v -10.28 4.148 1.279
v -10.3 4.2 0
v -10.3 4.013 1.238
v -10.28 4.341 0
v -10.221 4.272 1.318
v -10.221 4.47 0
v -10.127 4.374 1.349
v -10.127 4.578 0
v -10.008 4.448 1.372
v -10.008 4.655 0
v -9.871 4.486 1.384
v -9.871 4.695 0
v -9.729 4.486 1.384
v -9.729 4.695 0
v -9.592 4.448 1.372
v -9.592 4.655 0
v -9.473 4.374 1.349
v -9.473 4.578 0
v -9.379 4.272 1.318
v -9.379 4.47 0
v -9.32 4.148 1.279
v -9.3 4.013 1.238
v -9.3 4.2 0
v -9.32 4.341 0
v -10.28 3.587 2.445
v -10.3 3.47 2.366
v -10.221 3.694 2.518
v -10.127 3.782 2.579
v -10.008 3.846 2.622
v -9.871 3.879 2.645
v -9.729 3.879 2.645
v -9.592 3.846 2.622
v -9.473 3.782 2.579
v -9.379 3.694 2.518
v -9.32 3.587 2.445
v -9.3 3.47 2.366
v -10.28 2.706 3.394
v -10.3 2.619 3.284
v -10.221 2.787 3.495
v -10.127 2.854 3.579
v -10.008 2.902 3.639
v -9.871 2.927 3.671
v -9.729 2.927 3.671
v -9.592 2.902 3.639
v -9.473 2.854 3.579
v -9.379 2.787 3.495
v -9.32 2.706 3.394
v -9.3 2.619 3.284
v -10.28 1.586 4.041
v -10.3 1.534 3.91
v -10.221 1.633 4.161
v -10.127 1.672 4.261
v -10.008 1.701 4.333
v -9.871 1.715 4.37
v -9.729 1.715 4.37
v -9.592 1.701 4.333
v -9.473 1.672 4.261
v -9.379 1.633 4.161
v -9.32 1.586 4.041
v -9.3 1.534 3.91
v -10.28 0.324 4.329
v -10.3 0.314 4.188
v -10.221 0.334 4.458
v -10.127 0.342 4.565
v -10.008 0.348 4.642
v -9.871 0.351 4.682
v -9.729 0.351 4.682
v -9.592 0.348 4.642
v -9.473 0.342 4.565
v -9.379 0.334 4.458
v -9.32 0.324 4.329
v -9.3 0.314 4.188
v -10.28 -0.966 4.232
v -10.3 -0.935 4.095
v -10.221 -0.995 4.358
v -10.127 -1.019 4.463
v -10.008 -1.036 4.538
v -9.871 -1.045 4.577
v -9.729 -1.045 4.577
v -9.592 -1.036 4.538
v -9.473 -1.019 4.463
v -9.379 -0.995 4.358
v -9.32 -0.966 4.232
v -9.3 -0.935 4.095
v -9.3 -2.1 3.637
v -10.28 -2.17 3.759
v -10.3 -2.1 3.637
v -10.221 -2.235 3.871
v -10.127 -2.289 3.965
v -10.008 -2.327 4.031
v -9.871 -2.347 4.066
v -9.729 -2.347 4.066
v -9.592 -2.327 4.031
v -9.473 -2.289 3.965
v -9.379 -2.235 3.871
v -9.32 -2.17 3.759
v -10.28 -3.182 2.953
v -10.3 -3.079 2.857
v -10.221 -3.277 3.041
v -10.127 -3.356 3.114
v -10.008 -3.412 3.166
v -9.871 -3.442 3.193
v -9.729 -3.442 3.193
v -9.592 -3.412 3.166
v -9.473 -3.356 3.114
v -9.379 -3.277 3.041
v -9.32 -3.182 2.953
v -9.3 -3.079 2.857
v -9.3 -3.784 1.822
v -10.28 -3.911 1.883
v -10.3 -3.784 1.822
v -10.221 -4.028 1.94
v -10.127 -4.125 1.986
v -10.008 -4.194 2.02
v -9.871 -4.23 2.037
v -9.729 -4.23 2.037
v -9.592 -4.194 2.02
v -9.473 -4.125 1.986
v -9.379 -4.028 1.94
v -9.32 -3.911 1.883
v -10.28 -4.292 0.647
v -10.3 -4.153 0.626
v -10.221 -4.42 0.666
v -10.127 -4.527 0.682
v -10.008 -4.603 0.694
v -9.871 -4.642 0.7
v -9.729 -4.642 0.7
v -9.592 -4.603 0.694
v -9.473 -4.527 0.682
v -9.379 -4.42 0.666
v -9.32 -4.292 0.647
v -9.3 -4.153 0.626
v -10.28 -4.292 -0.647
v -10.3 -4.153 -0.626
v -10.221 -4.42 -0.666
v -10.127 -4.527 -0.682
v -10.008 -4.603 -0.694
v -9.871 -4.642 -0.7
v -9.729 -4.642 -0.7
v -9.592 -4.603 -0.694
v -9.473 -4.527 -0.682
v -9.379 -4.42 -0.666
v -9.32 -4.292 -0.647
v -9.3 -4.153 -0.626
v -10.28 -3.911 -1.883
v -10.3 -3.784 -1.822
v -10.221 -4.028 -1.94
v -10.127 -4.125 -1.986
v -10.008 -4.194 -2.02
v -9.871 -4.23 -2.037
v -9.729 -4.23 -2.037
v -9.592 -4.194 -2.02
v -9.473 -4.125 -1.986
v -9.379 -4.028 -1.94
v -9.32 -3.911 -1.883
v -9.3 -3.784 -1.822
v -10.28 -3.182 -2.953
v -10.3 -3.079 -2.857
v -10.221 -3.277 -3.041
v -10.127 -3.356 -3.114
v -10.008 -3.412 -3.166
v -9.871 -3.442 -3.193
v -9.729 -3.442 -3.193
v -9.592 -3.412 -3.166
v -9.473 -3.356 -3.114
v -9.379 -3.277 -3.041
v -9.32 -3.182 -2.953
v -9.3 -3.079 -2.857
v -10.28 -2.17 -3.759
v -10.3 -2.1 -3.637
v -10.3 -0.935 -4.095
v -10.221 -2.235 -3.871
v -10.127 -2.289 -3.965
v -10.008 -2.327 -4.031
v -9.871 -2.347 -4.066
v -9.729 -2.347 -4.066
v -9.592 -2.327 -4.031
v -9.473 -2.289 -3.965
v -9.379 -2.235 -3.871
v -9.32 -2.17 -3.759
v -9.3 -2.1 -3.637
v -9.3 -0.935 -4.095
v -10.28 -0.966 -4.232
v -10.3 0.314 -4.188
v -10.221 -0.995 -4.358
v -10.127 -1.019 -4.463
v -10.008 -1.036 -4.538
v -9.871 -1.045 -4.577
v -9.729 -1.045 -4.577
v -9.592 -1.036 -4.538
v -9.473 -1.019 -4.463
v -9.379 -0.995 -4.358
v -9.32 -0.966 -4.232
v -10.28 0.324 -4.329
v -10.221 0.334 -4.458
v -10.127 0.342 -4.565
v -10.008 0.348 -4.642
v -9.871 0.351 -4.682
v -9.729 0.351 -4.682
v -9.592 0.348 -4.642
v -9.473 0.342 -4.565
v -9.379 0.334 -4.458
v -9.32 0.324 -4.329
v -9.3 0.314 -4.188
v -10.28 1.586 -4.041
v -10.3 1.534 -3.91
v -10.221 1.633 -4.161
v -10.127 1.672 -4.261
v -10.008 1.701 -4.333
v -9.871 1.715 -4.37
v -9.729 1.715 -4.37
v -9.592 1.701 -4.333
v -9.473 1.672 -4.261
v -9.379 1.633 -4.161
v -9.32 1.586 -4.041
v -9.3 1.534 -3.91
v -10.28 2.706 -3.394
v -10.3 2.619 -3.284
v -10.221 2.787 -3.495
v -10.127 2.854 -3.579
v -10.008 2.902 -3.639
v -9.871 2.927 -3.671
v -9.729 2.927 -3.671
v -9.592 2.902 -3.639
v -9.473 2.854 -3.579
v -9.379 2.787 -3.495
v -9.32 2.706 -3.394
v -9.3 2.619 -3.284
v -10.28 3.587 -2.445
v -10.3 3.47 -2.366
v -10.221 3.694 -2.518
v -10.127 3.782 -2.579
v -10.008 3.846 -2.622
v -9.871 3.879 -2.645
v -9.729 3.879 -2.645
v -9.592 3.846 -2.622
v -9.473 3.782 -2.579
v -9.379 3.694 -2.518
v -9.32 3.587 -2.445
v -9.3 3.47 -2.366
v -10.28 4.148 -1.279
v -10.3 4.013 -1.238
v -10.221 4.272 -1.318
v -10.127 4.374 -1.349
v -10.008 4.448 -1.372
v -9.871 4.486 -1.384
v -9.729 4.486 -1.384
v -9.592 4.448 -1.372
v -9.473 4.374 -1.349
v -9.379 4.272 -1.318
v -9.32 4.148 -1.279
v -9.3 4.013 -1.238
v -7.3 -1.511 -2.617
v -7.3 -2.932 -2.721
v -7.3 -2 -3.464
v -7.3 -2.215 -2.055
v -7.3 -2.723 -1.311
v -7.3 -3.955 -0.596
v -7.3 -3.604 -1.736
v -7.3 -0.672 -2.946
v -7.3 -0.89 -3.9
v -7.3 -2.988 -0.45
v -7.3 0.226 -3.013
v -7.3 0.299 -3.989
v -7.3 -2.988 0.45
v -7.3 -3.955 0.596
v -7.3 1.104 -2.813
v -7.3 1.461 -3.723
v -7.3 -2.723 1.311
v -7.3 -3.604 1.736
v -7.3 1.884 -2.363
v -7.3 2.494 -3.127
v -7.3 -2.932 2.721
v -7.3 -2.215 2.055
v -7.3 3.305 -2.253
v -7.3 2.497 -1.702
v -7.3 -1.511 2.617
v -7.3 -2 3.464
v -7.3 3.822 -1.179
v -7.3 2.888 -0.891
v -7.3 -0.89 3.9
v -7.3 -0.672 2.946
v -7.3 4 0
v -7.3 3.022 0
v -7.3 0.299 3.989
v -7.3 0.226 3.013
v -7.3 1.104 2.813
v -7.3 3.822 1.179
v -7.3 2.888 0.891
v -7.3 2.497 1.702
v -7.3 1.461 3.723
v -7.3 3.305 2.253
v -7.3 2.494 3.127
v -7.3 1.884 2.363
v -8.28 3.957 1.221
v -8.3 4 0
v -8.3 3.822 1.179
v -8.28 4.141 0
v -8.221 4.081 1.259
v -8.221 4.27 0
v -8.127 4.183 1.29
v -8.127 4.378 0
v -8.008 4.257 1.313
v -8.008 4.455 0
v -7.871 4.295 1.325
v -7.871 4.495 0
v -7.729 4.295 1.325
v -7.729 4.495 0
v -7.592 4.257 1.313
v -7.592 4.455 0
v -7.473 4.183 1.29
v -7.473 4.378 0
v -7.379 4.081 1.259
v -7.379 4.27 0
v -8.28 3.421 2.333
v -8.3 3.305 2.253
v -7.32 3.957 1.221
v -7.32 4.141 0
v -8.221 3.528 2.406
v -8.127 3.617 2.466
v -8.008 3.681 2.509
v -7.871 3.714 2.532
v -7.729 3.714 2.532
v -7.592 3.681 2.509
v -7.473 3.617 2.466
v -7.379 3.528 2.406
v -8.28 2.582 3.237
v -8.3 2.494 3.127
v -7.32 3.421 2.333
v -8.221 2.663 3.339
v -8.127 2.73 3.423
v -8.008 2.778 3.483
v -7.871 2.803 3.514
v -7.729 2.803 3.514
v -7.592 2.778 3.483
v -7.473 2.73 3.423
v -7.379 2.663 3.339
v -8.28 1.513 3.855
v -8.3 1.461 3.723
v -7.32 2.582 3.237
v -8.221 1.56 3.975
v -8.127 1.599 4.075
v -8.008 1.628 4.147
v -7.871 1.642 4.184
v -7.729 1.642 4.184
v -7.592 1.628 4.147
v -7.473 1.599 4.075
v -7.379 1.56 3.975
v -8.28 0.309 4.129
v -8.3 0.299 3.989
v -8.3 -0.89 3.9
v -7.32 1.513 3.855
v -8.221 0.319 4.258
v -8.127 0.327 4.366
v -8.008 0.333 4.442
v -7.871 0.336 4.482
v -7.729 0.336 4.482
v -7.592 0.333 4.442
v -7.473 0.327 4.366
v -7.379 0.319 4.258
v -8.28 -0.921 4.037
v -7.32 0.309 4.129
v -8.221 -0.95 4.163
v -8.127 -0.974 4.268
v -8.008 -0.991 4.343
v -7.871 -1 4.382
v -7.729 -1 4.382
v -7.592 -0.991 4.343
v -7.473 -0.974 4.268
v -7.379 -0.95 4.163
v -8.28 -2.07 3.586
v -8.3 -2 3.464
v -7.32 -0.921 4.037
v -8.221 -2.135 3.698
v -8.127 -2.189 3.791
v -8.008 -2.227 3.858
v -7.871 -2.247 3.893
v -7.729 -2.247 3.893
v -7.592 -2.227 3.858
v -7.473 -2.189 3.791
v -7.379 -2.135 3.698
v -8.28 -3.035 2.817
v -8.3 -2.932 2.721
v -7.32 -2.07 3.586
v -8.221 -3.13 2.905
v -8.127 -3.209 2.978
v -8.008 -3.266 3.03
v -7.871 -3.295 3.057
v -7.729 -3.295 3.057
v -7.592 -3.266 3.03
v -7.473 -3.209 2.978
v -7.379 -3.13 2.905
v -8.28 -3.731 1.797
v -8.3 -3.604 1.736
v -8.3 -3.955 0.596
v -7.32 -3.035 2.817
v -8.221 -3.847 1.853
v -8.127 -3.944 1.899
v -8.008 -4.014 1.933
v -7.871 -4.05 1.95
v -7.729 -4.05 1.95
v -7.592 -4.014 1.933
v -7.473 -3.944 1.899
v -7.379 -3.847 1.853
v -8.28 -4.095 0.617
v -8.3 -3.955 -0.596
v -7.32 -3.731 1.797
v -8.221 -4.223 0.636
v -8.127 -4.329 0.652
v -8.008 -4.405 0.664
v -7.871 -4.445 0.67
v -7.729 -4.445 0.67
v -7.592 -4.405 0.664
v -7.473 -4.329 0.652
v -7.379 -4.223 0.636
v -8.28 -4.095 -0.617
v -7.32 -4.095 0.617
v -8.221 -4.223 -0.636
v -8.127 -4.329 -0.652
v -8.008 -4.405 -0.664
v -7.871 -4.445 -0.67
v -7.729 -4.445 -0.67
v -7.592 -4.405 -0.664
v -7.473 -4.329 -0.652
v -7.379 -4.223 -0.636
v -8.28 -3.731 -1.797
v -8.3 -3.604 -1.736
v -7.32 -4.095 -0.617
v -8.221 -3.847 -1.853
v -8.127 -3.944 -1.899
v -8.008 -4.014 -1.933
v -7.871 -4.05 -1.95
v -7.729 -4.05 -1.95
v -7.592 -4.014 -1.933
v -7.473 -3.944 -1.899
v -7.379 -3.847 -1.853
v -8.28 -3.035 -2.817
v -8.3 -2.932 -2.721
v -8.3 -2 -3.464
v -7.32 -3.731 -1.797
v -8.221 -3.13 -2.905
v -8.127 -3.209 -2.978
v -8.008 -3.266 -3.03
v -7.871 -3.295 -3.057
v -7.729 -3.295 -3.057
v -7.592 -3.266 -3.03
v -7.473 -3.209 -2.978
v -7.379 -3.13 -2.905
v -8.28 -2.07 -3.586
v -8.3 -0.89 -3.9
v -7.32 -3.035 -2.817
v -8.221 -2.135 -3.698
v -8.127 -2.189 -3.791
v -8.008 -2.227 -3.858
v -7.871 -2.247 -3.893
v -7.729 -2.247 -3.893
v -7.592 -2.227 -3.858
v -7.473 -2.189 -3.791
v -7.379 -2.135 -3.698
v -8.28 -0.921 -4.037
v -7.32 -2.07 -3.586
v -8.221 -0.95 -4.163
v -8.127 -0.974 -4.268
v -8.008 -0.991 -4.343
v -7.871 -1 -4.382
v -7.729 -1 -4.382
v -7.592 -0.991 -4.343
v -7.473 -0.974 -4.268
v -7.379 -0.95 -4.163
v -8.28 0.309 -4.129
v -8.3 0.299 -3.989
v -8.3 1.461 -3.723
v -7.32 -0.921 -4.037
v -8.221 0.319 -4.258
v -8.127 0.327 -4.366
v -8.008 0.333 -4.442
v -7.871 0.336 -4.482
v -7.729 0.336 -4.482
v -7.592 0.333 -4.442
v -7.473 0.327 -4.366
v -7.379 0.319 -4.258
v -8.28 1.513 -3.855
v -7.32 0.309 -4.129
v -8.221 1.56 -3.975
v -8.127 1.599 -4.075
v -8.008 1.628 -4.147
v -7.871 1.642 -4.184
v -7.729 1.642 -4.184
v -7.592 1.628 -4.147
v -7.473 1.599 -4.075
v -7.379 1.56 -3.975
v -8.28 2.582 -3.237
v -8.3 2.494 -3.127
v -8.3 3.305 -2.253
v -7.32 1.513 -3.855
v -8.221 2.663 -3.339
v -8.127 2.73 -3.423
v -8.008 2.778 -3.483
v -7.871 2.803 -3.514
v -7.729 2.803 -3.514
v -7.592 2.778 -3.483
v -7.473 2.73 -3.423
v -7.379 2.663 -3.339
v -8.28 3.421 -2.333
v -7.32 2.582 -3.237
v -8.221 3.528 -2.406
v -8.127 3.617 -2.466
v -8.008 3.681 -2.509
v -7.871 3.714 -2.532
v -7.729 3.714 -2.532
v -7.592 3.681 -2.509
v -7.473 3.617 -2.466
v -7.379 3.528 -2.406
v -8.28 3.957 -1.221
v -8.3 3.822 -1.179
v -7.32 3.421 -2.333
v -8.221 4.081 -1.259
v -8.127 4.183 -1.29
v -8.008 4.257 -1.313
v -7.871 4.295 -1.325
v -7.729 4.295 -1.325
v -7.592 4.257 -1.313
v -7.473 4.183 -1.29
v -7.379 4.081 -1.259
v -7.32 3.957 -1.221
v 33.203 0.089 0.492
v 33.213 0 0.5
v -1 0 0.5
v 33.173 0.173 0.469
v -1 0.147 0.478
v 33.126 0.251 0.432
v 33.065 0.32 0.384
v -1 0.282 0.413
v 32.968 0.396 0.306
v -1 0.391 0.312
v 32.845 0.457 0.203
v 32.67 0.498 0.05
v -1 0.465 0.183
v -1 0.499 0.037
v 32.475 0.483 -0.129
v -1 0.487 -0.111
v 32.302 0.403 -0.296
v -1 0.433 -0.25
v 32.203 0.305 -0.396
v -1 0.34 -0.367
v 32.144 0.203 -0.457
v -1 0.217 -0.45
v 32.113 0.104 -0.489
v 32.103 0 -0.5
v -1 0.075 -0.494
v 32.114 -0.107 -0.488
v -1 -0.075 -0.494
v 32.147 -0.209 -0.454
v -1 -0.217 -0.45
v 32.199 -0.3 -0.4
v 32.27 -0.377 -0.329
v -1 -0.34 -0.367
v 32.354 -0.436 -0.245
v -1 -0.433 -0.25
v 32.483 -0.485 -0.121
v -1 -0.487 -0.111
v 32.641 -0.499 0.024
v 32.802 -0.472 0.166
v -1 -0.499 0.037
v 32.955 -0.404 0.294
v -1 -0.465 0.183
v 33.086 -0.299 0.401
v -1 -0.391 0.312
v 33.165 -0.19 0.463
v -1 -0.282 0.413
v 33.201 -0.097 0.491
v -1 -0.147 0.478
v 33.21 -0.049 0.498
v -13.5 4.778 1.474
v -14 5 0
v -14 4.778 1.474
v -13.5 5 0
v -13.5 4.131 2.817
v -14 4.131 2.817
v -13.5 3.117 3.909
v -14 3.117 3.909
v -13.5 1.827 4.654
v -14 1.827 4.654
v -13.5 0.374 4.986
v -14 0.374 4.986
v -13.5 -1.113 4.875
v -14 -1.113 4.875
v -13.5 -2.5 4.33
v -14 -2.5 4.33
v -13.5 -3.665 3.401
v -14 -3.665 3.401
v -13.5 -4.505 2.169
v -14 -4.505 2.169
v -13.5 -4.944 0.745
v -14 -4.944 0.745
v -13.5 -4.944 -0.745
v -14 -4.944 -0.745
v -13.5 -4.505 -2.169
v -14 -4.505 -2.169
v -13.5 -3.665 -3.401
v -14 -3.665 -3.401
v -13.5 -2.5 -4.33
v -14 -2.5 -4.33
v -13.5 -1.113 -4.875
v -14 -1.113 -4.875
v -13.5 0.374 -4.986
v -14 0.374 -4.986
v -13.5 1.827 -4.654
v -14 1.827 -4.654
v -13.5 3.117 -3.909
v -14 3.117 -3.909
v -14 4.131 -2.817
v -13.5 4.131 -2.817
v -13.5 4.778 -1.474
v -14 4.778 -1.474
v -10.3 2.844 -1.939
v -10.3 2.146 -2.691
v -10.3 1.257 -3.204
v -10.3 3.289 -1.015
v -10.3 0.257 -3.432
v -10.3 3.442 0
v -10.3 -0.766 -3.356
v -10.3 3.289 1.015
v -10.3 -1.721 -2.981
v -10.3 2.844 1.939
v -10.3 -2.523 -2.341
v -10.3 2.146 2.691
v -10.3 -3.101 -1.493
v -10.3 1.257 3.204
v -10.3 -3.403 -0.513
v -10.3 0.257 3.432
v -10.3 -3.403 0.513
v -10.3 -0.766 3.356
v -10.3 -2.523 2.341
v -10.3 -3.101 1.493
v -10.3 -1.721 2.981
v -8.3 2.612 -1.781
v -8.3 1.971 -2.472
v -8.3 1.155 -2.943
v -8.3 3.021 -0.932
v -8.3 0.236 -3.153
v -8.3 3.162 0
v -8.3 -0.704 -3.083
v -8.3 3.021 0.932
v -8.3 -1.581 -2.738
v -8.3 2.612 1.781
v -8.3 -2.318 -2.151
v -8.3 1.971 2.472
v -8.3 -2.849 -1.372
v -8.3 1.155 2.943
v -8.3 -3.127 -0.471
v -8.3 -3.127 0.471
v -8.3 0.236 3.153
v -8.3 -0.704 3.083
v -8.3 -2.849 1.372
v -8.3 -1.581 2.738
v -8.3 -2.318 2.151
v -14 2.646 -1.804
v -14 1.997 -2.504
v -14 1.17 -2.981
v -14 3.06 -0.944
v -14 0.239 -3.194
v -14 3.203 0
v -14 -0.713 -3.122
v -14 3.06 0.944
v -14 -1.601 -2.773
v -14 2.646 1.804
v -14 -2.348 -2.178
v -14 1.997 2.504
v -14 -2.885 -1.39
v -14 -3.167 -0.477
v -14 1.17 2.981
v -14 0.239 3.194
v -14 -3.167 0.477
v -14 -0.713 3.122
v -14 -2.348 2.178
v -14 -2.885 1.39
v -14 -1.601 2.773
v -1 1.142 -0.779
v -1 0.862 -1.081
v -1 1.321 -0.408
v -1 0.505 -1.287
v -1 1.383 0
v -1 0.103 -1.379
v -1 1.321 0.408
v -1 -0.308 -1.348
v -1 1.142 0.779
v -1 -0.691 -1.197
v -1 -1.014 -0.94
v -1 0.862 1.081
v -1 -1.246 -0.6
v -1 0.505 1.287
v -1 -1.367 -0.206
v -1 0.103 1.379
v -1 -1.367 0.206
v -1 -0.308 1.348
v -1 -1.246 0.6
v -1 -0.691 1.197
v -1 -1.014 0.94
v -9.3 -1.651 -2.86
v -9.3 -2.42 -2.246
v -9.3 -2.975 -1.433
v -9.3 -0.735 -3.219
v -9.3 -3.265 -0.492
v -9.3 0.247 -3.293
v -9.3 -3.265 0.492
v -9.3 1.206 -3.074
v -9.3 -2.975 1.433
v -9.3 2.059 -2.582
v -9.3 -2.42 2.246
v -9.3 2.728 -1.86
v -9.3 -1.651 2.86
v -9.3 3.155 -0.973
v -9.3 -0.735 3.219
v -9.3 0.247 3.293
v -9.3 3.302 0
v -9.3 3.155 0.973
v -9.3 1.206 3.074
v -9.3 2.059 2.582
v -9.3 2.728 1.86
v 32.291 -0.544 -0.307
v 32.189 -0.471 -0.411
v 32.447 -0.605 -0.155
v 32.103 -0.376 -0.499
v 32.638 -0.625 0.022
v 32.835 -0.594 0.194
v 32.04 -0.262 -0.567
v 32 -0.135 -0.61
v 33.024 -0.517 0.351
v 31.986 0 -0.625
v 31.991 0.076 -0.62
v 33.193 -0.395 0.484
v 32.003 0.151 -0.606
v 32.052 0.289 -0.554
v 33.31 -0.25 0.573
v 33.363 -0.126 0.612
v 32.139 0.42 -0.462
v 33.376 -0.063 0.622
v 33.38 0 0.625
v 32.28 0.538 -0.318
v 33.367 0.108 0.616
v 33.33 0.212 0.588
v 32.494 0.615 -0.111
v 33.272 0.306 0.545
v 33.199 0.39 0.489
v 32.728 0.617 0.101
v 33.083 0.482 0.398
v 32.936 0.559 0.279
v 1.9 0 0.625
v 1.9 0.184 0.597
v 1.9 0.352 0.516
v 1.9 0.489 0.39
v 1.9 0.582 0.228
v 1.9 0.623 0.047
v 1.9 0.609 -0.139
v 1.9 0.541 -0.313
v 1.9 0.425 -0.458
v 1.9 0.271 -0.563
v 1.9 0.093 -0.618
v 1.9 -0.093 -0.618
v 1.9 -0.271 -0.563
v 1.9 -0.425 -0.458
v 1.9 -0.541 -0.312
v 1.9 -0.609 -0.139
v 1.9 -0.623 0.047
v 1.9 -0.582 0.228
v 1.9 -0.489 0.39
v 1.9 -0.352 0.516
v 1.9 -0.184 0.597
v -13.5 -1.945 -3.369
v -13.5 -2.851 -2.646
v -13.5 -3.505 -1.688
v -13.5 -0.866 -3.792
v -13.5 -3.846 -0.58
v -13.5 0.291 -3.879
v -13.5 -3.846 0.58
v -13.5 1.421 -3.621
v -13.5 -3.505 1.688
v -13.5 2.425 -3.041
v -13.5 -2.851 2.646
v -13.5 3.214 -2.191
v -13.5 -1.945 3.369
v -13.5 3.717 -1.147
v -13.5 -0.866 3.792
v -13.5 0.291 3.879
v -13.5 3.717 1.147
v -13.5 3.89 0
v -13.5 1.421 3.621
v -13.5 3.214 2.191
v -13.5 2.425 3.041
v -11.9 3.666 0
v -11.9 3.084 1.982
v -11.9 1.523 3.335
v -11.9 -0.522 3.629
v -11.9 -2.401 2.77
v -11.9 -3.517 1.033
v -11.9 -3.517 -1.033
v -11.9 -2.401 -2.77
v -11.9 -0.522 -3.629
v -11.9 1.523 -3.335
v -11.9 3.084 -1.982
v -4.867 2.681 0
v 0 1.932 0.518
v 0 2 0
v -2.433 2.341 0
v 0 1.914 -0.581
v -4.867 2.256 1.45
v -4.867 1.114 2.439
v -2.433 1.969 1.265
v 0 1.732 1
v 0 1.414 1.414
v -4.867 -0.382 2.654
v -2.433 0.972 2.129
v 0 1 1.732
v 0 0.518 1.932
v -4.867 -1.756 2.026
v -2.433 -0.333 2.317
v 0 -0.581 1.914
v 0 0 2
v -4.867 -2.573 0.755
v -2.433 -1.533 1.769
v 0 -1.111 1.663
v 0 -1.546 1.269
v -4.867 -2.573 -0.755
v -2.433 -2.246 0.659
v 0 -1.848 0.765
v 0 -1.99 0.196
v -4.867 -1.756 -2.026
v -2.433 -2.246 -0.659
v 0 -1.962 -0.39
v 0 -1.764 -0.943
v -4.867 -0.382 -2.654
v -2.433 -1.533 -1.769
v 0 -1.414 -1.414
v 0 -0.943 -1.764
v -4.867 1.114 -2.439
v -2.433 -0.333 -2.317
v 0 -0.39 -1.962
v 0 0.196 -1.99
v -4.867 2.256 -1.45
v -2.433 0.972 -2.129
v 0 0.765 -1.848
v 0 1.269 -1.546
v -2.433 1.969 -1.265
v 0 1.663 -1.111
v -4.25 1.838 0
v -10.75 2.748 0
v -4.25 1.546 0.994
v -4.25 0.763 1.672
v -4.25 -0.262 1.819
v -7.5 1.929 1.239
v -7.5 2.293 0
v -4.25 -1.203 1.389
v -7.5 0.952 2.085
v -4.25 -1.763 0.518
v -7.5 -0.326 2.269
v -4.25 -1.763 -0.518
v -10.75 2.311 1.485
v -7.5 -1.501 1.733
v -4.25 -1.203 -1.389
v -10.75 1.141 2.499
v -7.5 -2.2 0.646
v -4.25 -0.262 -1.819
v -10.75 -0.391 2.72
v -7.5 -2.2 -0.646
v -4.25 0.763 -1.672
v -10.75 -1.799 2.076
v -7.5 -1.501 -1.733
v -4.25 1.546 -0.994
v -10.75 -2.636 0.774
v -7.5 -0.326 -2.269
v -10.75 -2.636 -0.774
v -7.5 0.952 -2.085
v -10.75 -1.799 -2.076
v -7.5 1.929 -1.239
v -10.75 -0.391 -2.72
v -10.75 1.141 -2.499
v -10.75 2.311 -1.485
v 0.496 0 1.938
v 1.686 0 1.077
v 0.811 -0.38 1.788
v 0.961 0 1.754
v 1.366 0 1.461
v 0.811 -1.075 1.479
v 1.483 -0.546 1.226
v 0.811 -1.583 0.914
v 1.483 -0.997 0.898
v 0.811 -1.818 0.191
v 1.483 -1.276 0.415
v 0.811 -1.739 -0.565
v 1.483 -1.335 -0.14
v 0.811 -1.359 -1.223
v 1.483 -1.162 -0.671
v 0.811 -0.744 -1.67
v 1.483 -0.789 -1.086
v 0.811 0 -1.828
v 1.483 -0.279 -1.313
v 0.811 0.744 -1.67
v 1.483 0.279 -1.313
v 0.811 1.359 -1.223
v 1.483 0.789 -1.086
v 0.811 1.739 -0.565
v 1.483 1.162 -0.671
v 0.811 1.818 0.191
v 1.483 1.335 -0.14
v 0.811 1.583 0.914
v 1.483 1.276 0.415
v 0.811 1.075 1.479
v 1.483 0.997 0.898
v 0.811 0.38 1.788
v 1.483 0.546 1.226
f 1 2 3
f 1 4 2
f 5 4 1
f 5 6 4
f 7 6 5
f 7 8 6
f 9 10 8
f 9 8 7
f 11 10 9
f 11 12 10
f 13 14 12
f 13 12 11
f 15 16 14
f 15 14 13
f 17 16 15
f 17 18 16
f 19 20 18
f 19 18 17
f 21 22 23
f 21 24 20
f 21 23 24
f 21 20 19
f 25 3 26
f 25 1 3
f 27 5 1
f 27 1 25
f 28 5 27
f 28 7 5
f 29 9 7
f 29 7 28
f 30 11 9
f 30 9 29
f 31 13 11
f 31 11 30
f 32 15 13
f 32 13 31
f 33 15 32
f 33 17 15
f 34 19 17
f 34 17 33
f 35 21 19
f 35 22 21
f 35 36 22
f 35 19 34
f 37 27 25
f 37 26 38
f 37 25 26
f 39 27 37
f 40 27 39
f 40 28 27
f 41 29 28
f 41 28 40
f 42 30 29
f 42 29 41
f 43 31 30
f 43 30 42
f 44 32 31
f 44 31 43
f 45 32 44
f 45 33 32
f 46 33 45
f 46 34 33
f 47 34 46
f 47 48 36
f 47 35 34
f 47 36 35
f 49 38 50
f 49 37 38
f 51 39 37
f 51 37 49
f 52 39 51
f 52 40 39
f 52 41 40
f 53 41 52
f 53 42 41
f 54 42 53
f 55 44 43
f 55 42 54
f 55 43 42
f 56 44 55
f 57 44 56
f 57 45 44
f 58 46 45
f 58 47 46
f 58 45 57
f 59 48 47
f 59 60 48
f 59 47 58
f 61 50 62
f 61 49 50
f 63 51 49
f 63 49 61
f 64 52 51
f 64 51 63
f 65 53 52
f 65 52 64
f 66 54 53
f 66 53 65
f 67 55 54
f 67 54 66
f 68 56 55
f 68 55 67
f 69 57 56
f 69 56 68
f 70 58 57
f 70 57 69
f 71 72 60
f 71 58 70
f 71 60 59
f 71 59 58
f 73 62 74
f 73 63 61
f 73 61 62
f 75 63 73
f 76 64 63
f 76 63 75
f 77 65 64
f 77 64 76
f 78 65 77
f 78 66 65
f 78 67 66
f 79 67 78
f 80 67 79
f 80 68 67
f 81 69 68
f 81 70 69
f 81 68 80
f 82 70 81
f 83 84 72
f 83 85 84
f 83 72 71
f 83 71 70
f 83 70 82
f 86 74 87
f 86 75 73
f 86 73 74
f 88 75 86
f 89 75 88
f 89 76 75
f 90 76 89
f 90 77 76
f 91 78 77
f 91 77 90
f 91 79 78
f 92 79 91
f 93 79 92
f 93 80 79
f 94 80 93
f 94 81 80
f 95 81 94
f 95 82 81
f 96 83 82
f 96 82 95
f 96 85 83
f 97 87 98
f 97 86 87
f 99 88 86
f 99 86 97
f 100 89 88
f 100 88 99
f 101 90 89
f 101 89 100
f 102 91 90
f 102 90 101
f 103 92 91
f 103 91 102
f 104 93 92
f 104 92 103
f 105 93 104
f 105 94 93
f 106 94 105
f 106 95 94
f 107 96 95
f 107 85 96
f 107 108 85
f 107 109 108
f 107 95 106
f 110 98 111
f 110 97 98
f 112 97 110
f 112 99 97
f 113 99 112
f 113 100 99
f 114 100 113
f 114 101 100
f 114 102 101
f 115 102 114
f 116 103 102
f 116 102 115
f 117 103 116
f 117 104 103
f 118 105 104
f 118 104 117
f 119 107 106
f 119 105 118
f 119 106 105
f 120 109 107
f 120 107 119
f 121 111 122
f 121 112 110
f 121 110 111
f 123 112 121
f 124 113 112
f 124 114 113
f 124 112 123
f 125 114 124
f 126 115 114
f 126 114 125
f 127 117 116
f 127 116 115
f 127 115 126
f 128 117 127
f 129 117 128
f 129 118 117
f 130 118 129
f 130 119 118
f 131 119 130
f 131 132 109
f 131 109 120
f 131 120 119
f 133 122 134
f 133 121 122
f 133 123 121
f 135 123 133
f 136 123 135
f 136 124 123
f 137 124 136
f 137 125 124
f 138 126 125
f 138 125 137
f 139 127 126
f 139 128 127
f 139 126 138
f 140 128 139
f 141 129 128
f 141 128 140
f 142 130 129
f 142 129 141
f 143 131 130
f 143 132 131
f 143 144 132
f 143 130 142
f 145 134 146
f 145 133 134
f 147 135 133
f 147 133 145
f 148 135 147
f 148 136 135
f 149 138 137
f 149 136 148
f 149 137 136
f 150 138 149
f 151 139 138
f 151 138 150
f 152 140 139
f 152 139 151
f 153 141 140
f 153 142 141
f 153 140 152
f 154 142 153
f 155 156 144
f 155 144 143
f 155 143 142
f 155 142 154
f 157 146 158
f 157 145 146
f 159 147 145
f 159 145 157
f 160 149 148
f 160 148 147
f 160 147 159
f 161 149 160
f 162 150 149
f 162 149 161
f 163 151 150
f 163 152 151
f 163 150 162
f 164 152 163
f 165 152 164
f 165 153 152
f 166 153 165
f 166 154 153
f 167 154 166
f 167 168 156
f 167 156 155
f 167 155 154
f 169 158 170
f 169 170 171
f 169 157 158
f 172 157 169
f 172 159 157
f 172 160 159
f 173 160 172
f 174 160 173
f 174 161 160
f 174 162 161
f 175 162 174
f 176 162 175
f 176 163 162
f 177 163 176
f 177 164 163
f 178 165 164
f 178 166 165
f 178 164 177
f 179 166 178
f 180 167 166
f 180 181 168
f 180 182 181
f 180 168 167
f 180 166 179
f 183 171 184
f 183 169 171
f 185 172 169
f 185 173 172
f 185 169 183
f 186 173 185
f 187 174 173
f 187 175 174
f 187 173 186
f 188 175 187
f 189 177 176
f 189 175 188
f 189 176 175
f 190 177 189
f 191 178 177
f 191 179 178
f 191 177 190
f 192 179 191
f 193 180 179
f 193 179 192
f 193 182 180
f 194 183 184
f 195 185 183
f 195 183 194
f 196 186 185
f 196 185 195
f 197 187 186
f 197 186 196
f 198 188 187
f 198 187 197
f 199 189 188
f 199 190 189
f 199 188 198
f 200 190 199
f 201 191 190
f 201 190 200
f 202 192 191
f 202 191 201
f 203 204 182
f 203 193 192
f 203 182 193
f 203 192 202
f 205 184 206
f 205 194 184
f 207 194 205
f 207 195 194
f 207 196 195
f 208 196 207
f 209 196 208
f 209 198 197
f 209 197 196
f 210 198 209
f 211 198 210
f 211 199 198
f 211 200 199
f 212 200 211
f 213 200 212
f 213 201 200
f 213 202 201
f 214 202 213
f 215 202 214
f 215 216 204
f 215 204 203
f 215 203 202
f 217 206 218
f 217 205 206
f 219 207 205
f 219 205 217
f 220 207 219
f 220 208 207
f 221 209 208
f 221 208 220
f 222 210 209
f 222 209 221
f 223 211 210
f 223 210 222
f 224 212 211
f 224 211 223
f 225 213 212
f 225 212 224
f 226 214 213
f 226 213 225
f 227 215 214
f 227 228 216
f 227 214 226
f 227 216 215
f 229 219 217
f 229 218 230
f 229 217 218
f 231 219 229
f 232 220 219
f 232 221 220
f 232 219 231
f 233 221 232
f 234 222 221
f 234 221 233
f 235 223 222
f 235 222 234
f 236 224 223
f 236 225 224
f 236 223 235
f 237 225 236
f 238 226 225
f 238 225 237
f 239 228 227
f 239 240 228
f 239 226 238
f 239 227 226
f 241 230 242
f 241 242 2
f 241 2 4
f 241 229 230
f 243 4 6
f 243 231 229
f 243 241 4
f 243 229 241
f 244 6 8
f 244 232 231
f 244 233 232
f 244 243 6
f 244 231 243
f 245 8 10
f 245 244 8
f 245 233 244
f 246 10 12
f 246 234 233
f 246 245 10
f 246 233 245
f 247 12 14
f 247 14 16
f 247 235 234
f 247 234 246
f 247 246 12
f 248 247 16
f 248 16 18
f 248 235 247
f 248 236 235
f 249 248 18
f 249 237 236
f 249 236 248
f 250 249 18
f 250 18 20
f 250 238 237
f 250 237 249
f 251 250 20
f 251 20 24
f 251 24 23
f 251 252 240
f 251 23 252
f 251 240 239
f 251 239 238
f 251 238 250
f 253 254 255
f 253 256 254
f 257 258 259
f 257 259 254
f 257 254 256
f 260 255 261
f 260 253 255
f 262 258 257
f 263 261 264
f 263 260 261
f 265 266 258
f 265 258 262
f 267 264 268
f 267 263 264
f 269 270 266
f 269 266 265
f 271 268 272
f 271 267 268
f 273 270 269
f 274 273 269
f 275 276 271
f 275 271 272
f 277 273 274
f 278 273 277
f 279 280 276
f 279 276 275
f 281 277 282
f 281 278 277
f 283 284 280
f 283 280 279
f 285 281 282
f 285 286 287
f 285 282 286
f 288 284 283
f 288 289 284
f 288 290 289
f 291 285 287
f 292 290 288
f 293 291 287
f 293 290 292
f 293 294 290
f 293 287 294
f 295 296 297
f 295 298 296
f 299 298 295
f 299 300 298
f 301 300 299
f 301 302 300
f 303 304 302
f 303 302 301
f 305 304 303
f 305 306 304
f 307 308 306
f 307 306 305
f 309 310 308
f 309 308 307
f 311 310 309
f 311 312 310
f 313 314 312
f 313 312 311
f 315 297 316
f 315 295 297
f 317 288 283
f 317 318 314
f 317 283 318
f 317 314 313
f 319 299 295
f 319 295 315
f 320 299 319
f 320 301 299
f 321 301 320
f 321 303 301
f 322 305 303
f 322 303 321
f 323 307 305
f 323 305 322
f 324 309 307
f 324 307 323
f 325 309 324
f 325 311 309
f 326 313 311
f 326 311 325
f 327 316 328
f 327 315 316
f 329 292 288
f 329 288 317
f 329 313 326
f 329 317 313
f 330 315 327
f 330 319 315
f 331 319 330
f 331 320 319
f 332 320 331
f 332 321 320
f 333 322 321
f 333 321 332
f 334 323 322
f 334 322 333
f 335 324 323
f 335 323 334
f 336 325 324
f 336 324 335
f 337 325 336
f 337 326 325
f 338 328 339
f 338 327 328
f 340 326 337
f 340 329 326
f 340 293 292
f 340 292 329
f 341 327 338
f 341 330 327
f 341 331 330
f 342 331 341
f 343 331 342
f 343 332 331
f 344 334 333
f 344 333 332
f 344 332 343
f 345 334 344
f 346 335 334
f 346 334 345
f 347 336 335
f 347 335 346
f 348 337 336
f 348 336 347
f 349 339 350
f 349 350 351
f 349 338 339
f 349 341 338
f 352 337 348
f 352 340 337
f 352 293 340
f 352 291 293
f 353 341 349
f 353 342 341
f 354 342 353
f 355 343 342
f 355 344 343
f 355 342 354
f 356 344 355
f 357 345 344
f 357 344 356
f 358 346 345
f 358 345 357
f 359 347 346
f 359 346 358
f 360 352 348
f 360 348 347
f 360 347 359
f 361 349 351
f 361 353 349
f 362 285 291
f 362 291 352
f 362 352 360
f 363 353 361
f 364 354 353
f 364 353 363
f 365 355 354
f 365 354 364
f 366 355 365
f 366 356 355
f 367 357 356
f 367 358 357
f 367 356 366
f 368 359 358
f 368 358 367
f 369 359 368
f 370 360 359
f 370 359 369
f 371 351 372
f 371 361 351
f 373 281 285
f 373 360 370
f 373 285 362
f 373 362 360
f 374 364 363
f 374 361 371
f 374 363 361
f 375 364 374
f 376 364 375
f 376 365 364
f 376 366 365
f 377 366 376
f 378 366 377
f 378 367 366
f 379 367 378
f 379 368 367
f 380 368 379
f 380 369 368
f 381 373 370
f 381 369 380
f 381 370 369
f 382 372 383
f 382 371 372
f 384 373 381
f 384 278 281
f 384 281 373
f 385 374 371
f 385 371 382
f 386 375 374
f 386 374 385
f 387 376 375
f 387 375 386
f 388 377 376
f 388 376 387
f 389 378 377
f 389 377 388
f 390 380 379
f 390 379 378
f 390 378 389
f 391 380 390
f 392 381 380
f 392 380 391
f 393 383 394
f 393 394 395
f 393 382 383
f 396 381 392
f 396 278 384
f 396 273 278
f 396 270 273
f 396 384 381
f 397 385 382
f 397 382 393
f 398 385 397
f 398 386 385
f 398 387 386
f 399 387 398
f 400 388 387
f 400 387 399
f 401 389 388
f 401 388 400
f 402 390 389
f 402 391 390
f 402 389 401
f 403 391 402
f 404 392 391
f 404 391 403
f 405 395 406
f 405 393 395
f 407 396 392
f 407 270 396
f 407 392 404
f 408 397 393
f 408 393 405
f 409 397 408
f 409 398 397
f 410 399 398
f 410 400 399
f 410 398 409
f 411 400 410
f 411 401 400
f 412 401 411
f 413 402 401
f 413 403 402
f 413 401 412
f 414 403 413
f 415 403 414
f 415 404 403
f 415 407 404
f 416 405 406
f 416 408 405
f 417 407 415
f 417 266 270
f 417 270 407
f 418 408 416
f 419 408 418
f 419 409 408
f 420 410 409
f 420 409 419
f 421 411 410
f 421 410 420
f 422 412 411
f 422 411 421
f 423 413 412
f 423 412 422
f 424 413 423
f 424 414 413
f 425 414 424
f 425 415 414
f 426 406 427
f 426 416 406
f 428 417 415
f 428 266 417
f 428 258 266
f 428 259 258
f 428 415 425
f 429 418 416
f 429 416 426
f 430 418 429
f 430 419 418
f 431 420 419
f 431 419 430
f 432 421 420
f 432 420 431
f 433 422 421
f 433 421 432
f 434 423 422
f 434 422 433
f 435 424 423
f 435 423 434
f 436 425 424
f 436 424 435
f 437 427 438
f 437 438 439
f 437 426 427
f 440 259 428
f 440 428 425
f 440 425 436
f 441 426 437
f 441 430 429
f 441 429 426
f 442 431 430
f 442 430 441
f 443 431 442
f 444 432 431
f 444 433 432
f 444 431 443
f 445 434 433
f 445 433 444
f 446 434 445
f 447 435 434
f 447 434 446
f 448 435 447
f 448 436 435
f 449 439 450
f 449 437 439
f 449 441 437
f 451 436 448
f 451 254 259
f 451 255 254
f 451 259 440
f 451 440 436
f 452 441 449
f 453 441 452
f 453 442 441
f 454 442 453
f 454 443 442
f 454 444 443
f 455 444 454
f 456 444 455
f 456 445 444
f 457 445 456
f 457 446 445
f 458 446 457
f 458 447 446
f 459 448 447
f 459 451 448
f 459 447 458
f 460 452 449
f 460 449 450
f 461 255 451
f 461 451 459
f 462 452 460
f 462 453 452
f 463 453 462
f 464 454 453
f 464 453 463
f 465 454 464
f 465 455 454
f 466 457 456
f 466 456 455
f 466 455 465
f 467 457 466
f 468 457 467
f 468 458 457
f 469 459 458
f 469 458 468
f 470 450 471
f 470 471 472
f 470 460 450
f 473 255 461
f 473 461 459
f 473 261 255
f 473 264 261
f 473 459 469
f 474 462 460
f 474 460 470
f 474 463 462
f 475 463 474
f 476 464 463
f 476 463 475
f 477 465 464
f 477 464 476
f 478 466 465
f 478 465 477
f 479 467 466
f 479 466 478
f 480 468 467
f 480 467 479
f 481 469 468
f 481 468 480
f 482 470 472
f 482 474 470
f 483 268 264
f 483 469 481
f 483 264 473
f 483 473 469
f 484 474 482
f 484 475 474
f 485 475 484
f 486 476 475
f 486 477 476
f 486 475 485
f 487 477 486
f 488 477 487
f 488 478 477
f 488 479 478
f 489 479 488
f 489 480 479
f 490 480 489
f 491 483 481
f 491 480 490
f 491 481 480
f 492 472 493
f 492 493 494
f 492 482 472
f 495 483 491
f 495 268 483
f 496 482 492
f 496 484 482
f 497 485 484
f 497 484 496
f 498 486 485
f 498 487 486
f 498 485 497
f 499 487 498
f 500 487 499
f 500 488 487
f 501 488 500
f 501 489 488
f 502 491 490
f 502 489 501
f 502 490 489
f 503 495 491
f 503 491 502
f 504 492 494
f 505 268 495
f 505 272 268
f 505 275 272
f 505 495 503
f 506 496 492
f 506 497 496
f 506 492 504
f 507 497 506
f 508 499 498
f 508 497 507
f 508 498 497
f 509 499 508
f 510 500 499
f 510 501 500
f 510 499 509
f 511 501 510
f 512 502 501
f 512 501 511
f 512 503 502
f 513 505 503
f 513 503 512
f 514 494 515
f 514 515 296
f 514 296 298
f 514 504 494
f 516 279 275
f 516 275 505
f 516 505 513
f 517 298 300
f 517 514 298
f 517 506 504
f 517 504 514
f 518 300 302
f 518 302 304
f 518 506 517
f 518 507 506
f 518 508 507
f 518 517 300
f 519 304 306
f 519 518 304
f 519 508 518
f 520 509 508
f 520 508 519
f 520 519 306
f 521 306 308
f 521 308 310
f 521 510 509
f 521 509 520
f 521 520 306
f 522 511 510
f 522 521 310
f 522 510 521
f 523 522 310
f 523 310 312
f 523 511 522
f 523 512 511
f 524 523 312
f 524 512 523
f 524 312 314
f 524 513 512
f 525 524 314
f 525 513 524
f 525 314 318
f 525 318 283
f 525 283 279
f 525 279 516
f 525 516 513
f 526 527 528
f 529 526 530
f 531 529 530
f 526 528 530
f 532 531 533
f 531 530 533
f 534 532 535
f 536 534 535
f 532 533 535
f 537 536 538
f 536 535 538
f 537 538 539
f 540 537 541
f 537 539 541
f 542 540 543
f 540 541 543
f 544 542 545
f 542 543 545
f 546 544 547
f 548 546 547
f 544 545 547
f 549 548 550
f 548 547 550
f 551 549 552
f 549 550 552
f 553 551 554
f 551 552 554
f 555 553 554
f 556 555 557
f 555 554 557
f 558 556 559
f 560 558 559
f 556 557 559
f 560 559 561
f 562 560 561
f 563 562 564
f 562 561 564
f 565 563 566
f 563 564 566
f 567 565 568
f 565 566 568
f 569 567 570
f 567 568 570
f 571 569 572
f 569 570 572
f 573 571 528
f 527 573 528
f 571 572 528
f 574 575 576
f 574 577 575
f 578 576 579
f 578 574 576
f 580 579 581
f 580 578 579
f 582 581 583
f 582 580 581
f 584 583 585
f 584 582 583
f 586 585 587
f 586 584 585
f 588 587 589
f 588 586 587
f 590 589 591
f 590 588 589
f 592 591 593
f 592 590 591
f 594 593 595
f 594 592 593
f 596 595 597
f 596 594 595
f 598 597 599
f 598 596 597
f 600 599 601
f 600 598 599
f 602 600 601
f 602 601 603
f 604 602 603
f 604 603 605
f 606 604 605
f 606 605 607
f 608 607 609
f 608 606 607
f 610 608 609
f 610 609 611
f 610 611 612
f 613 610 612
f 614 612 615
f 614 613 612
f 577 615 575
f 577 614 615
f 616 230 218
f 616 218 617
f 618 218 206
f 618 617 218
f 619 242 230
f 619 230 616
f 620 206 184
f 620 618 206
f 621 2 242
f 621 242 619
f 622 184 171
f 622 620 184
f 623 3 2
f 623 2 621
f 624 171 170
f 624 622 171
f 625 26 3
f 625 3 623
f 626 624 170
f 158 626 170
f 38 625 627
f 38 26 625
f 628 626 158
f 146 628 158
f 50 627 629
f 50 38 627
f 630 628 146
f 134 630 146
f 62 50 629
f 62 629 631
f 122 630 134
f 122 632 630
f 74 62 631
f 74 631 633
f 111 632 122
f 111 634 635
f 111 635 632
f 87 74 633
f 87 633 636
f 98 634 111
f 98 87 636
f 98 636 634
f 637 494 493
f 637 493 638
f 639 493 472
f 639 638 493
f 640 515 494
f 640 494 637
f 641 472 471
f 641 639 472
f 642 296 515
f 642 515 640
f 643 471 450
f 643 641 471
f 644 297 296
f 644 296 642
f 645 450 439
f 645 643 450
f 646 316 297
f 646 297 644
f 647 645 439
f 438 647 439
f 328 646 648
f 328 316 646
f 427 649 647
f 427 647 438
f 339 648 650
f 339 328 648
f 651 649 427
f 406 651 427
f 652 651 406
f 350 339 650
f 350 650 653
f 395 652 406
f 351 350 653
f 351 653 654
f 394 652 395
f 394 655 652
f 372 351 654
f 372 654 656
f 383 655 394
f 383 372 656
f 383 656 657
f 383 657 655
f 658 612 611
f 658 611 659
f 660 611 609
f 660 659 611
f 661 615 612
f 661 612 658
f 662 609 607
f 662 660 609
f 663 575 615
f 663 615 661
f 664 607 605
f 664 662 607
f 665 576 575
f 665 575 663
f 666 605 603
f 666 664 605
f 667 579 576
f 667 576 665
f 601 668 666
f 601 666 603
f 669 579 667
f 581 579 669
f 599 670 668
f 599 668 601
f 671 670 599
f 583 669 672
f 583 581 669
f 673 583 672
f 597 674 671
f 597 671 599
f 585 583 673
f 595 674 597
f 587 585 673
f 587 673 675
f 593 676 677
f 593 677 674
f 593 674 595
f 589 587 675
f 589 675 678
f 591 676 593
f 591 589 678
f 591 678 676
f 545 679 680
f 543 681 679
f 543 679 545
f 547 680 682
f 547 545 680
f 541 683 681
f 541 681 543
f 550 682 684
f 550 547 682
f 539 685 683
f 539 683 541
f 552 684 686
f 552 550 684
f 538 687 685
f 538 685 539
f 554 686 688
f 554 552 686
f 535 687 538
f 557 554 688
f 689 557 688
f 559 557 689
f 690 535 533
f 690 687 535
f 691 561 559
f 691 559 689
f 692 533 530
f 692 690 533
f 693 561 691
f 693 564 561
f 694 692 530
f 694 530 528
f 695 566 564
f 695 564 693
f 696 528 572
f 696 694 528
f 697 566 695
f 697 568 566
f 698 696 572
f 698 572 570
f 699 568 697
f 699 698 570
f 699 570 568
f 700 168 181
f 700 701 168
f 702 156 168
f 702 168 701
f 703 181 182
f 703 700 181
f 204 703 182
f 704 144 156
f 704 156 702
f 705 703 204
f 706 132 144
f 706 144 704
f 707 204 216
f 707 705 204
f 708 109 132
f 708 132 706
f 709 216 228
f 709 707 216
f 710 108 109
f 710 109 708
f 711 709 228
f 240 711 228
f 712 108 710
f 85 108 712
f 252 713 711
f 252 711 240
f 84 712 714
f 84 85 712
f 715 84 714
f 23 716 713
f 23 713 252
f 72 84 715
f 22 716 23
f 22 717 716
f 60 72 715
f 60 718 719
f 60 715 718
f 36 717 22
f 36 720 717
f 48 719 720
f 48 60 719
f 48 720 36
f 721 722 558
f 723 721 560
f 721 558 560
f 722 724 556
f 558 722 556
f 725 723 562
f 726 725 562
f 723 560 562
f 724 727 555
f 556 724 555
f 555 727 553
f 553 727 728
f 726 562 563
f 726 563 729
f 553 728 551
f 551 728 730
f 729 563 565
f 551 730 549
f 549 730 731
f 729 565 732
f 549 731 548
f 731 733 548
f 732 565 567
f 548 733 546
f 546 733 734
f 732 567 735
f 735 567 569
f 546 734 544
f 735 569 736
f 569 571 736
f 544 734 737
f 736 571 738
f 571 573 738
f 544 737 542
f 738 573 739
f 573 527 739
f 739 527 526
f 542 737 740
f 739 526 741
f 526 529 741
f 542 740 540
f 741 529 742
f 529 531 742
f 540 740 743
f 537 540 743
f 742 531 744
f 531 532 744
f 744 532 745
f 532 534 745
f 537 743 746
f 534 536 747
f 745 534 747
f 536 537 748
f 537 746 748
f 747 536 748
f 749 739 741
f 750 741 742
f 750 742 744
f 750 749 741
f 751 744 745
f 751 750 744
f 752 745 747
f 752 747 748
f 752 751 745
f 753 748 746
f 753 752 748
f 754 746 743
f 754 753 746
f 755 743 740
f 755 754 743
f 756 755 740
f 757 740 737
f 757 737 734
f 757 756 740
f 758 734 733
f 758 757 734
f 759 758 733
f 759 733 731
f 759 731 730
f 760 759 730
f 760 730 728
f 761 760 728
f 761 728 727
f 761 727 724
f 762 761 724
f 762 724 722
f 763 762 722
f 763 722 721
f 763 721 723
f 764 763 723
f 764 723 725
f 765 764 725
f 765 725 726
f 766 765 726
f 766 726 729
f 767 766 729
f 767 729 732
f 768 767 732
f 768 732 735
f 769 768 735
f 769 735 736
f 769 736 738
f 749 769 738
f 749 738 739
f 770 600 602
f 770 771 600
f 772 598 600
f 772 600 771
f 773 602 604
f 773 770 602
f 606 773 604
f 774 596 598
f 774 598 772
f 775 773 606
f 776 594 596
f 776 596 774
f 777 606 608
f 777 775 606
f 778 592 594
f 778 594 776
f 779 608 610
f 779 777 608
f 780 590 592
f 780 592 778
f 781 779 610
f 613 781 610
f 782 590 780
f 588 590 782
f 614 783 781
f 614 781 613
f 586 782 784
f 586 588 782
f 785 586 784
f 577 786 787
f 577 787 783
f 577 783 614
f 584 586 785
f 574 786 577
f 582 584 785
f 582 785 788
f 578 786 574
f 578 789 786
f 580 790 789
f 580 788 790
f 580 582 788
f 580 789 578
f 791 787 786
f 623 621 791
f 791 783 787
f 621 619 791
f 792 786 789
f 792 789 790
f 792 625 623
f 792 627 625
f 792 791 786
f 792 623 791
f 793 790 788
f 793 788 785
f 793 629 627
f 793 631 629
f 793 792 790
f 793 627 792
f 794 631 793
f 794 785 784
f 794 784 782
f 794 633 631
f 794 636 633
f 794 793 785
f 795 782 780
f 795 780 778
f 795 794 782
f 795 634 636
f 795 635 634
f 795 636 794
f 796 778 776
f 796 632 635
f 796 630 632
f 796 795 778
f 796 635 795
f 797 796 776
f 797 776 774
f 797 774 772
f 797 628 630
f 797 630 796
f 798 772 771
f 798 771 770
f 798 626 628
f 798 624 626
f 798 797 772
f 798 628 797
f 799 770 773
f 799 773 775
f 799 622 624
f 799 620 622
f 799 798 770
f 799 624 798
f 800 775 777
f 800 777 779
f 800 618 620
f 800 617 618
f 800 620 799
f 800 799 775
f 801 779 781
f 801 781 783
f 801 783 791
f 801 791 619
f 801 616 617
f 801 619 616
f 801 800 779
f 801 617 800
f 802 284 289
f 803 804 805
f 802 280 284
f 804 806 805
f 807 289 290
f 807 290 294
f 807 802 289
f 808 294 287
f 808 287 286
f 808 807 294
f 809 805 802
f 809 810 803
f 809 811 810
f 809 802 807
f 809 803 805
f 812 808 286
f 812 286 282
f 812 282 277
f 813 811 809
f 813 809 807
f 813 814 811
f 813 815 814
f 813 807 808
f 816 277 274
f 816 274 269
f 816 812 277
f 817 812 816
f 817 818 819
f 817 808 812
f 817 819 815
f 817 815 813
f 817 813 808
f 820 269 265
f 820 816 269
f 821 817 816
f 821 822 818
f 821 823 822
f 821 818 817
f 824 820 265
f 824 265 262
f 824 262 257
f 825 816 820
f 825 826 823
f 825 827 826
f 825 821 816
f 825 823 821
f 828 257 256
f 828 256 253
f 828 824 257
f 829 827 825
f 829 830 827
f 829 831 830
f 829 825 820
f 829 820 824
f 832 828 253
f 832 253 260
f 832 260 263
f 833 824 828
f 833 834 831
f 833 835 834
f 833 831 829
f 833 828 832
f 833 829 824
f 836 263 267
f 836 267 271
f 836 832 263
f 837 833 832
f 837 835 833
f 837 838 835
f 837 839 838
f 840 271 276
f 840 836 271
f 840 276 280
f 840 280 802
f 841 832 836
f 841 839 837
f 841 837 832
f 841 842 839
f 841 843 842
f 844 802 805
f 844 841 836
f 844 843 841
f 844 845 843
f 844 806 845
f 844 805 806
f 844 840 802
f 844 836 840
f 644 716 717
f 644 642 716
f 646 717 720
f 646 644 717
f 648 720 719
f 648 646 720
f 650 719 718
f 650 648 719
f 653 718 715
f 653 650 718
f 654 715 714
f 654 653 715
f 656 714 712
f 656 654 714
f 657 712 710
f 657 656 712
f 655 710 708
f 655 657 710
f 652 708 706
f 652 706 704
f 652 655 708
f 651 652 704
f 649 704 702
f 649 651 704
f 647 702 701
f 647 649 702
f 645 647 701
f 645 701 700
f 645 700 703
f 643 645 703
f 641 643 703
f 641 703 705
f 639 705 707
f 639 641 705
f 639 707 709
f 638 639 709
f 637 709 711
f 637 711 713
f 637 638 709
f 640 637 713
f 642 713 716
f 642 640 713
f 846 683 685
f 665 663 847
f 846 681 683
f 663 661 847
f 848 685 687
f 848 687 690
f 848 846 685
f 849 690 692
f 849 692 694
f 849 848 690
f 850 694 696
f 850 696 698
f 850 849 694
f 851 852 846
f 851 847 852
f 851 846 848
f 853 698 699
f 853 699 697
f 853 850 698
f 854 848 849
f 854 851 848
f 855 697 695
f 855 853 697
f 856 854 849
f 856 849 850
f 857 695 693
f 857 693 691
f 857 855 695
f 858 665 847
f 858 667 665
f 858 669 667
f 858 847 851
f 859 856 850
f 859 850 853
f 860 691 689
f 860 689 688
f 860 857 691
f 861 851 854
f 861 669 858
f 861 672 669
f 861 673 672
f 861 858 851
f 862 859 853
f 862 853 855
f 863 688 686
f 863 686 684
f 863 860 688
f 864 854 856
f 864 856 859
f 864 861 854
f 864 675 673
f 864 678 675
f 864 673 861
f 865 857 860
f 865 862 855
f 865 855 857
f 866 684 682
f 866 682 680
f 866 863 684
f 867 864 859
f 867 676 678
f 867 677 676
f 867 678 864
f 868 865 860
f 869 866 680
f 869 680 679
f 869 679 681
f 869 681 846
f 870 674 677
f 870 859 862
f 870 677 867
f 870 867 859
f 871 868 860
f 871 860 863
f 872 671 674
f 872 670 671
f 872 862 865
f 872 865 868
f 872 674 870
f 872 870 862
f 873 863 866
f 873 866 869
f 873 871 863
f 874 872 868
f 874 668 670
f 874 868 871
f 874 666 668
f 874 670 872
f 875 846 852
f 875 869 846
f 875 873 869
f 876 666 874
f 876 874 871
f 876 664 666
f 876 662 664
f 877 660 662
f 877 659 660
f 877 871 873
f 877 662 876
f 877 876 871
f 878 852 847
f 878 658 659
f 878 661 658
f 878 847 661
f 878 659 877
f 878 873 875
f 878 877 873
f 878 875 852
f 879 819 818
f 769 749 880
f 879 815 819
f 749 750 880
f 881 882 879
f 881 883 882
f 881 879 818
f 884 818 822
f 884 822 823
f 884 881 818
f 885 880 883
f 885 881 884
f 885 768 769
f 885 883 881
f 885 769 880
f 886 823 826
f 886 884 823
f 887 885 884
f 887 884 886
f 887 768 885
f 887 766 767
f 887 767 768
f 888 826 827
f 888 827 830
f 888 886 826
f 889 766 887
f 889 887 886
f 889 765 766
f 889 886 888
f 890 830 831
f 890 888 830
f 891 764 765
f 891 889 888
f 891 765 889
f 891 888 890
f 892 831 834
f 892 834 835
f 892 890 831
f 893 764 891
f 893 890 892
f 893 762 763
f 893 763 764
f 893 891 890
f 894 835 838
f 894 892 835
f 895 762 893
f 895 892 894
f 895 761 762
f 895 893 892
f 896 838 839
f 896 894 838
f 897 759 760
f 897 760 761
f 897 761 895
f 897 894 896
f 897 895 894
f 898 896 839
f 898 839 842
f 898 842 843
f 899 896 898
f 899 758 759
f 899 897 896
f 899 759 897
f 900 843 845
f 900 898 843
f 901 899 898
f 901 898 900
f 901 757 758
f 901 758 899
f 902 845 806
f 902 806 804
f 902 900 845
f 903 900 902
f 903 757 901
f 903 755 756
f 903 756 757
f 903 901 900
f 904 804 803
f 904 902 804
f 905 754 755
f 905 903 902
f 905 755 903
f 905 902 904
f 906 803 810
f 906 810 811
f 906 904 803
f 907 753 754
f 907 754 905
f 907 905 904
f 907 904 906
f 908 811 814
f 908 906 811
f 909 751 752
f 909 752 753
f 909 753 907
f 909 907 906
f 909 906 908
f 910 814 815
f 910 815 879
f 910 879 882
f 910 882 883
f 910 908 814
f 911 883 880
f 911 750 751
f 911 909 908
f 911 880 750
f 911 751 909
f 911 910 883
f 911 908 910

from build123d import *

# Parameters (mm, degrees)
DOME1_FACE_RADIUS       = 2
DOME1_HEIGHT            = 2
SKETCH5_R               = 0.5
CUT_EXTRUDE1_DEPTH      = 4
SKETCH6_R               = 0.625
SKETCH6_R_2             = 0.5
EXTRUDE_THIN1_DEPTH     = 40
SKETCH7_R               = 9.506624516
CUT_EXTRUDE2_DEPTH      = 6
CUT_EXTRUDE2_DEPTH_BACK = 6


with BuildPart() as part:
    # Sketch2 → Revolve1 (revolve)
    with BuildSketch(Plane.XY):
        with BuildLine():
            Line((0, 0), (-1, 0))
            Line((-1, 0), (-1, 1.382676537))
            Line((-1, 1.382676537), (-14, 3.202544081))
            Line((-14, 3.202544081), (-14, 3.240195922))
            Line((-14, 3.240195922), (-14, 5))
            Line((-14, 5), (-13.5, 5))
            Line((-13.5, 5), (-13.5, 3.889862449))
            Line((-13.5, 3.889862449), (-10.3, 3.441895054))
            Line((-10.3, 3.441895054), (-10.3, 4.2))
            ThreePointArc((-10.3, 4.2), (-9.8, 4.7), (-9.3, 4.2))
            Line((-9.3, 4.2), (-9.3, 3.301905243))
            Line((-9.3, 3.301905243), (-8.3, 3.161915432))
            Line((-8.3, 3.161915432), (-8.3, 4))
            ThreePointArc((-8.3, 4), (-7.8, 4.5), (-7.3, 4))
            Line((-7.3, 4), (-7.3, 3.021925621))
            Line((-7.3, 3.021925621), (0, 2))
            Line((0, 2), (0, 0))
        make_face()
    revolve(axis=Axis((-26.179667308, 0, 0), (1, 0, 0)))

    # Dome1: a dome of height H over a round flat face of radius A is a cap of a sphere of radius (A * A + H * H) / (2 * H)
    dome1_r = (DOME1_FACE_RADIUS * DOME1_FACE_RADIUS + DOME1_HEIGHT * DOME1_HEIGHT) / (2 * DOME1_HEIGHT)
    dome1_base = Plane((0, 0, 0), z_dir=(1, 0, 0))
    with Locations(dome1_base.offset(DOME1_HEIGHT - dome1_r)):
        dome1_ball = Sphere(dome1_r, mode=Mode.PRIVATE)
    add(split(dome1_ball, bisect_by=dome1_base, keep=Keep.TOP, mode=Mode.PRIVATE))

    # Sketch5 → Cut-Extrude1 (cut, through all)
    with BuildSketch(Plane.ZY.offset(1)):
        Circle(SKETCH5_R)
    extrude(amount=-CUT_EXTRUDE1_DEPTH, mode=Mode.SUBTRACT)

    # Sketch6 → Extrude-Thin1 (add)
    with BuildSketch(Plane.ZY.offset(1)):
        Circle(SKETCH6_R)
        Circle(SKETCH6_R_2, mode=Mode.SUBTRACT)
    extrude(amount=-EXTRUDE_THIN1_DEPTH)

    # Sketch7 → Cut-Extrude2 (cut, two sides)
    with BuildSketch(Plane(origin=(0, 0, 0), x_dir=(1, 0, 0), z_dir=(0, 1, 0))) as cut_extrude2_sk:
        with Locations((39, 7.04259074)):
            Circle(SKETCH7_R)
    extrude(amount=CUT_EXTRUDE2_DEPTH, mode=Mode.SUBTRACT)
    extrude(cut_extrude2_sk.sketch, amount=-CUT_EXTRUDE2_DEPTH_BACK, mode=Mode.SUBTRACT)


solid = part.part
